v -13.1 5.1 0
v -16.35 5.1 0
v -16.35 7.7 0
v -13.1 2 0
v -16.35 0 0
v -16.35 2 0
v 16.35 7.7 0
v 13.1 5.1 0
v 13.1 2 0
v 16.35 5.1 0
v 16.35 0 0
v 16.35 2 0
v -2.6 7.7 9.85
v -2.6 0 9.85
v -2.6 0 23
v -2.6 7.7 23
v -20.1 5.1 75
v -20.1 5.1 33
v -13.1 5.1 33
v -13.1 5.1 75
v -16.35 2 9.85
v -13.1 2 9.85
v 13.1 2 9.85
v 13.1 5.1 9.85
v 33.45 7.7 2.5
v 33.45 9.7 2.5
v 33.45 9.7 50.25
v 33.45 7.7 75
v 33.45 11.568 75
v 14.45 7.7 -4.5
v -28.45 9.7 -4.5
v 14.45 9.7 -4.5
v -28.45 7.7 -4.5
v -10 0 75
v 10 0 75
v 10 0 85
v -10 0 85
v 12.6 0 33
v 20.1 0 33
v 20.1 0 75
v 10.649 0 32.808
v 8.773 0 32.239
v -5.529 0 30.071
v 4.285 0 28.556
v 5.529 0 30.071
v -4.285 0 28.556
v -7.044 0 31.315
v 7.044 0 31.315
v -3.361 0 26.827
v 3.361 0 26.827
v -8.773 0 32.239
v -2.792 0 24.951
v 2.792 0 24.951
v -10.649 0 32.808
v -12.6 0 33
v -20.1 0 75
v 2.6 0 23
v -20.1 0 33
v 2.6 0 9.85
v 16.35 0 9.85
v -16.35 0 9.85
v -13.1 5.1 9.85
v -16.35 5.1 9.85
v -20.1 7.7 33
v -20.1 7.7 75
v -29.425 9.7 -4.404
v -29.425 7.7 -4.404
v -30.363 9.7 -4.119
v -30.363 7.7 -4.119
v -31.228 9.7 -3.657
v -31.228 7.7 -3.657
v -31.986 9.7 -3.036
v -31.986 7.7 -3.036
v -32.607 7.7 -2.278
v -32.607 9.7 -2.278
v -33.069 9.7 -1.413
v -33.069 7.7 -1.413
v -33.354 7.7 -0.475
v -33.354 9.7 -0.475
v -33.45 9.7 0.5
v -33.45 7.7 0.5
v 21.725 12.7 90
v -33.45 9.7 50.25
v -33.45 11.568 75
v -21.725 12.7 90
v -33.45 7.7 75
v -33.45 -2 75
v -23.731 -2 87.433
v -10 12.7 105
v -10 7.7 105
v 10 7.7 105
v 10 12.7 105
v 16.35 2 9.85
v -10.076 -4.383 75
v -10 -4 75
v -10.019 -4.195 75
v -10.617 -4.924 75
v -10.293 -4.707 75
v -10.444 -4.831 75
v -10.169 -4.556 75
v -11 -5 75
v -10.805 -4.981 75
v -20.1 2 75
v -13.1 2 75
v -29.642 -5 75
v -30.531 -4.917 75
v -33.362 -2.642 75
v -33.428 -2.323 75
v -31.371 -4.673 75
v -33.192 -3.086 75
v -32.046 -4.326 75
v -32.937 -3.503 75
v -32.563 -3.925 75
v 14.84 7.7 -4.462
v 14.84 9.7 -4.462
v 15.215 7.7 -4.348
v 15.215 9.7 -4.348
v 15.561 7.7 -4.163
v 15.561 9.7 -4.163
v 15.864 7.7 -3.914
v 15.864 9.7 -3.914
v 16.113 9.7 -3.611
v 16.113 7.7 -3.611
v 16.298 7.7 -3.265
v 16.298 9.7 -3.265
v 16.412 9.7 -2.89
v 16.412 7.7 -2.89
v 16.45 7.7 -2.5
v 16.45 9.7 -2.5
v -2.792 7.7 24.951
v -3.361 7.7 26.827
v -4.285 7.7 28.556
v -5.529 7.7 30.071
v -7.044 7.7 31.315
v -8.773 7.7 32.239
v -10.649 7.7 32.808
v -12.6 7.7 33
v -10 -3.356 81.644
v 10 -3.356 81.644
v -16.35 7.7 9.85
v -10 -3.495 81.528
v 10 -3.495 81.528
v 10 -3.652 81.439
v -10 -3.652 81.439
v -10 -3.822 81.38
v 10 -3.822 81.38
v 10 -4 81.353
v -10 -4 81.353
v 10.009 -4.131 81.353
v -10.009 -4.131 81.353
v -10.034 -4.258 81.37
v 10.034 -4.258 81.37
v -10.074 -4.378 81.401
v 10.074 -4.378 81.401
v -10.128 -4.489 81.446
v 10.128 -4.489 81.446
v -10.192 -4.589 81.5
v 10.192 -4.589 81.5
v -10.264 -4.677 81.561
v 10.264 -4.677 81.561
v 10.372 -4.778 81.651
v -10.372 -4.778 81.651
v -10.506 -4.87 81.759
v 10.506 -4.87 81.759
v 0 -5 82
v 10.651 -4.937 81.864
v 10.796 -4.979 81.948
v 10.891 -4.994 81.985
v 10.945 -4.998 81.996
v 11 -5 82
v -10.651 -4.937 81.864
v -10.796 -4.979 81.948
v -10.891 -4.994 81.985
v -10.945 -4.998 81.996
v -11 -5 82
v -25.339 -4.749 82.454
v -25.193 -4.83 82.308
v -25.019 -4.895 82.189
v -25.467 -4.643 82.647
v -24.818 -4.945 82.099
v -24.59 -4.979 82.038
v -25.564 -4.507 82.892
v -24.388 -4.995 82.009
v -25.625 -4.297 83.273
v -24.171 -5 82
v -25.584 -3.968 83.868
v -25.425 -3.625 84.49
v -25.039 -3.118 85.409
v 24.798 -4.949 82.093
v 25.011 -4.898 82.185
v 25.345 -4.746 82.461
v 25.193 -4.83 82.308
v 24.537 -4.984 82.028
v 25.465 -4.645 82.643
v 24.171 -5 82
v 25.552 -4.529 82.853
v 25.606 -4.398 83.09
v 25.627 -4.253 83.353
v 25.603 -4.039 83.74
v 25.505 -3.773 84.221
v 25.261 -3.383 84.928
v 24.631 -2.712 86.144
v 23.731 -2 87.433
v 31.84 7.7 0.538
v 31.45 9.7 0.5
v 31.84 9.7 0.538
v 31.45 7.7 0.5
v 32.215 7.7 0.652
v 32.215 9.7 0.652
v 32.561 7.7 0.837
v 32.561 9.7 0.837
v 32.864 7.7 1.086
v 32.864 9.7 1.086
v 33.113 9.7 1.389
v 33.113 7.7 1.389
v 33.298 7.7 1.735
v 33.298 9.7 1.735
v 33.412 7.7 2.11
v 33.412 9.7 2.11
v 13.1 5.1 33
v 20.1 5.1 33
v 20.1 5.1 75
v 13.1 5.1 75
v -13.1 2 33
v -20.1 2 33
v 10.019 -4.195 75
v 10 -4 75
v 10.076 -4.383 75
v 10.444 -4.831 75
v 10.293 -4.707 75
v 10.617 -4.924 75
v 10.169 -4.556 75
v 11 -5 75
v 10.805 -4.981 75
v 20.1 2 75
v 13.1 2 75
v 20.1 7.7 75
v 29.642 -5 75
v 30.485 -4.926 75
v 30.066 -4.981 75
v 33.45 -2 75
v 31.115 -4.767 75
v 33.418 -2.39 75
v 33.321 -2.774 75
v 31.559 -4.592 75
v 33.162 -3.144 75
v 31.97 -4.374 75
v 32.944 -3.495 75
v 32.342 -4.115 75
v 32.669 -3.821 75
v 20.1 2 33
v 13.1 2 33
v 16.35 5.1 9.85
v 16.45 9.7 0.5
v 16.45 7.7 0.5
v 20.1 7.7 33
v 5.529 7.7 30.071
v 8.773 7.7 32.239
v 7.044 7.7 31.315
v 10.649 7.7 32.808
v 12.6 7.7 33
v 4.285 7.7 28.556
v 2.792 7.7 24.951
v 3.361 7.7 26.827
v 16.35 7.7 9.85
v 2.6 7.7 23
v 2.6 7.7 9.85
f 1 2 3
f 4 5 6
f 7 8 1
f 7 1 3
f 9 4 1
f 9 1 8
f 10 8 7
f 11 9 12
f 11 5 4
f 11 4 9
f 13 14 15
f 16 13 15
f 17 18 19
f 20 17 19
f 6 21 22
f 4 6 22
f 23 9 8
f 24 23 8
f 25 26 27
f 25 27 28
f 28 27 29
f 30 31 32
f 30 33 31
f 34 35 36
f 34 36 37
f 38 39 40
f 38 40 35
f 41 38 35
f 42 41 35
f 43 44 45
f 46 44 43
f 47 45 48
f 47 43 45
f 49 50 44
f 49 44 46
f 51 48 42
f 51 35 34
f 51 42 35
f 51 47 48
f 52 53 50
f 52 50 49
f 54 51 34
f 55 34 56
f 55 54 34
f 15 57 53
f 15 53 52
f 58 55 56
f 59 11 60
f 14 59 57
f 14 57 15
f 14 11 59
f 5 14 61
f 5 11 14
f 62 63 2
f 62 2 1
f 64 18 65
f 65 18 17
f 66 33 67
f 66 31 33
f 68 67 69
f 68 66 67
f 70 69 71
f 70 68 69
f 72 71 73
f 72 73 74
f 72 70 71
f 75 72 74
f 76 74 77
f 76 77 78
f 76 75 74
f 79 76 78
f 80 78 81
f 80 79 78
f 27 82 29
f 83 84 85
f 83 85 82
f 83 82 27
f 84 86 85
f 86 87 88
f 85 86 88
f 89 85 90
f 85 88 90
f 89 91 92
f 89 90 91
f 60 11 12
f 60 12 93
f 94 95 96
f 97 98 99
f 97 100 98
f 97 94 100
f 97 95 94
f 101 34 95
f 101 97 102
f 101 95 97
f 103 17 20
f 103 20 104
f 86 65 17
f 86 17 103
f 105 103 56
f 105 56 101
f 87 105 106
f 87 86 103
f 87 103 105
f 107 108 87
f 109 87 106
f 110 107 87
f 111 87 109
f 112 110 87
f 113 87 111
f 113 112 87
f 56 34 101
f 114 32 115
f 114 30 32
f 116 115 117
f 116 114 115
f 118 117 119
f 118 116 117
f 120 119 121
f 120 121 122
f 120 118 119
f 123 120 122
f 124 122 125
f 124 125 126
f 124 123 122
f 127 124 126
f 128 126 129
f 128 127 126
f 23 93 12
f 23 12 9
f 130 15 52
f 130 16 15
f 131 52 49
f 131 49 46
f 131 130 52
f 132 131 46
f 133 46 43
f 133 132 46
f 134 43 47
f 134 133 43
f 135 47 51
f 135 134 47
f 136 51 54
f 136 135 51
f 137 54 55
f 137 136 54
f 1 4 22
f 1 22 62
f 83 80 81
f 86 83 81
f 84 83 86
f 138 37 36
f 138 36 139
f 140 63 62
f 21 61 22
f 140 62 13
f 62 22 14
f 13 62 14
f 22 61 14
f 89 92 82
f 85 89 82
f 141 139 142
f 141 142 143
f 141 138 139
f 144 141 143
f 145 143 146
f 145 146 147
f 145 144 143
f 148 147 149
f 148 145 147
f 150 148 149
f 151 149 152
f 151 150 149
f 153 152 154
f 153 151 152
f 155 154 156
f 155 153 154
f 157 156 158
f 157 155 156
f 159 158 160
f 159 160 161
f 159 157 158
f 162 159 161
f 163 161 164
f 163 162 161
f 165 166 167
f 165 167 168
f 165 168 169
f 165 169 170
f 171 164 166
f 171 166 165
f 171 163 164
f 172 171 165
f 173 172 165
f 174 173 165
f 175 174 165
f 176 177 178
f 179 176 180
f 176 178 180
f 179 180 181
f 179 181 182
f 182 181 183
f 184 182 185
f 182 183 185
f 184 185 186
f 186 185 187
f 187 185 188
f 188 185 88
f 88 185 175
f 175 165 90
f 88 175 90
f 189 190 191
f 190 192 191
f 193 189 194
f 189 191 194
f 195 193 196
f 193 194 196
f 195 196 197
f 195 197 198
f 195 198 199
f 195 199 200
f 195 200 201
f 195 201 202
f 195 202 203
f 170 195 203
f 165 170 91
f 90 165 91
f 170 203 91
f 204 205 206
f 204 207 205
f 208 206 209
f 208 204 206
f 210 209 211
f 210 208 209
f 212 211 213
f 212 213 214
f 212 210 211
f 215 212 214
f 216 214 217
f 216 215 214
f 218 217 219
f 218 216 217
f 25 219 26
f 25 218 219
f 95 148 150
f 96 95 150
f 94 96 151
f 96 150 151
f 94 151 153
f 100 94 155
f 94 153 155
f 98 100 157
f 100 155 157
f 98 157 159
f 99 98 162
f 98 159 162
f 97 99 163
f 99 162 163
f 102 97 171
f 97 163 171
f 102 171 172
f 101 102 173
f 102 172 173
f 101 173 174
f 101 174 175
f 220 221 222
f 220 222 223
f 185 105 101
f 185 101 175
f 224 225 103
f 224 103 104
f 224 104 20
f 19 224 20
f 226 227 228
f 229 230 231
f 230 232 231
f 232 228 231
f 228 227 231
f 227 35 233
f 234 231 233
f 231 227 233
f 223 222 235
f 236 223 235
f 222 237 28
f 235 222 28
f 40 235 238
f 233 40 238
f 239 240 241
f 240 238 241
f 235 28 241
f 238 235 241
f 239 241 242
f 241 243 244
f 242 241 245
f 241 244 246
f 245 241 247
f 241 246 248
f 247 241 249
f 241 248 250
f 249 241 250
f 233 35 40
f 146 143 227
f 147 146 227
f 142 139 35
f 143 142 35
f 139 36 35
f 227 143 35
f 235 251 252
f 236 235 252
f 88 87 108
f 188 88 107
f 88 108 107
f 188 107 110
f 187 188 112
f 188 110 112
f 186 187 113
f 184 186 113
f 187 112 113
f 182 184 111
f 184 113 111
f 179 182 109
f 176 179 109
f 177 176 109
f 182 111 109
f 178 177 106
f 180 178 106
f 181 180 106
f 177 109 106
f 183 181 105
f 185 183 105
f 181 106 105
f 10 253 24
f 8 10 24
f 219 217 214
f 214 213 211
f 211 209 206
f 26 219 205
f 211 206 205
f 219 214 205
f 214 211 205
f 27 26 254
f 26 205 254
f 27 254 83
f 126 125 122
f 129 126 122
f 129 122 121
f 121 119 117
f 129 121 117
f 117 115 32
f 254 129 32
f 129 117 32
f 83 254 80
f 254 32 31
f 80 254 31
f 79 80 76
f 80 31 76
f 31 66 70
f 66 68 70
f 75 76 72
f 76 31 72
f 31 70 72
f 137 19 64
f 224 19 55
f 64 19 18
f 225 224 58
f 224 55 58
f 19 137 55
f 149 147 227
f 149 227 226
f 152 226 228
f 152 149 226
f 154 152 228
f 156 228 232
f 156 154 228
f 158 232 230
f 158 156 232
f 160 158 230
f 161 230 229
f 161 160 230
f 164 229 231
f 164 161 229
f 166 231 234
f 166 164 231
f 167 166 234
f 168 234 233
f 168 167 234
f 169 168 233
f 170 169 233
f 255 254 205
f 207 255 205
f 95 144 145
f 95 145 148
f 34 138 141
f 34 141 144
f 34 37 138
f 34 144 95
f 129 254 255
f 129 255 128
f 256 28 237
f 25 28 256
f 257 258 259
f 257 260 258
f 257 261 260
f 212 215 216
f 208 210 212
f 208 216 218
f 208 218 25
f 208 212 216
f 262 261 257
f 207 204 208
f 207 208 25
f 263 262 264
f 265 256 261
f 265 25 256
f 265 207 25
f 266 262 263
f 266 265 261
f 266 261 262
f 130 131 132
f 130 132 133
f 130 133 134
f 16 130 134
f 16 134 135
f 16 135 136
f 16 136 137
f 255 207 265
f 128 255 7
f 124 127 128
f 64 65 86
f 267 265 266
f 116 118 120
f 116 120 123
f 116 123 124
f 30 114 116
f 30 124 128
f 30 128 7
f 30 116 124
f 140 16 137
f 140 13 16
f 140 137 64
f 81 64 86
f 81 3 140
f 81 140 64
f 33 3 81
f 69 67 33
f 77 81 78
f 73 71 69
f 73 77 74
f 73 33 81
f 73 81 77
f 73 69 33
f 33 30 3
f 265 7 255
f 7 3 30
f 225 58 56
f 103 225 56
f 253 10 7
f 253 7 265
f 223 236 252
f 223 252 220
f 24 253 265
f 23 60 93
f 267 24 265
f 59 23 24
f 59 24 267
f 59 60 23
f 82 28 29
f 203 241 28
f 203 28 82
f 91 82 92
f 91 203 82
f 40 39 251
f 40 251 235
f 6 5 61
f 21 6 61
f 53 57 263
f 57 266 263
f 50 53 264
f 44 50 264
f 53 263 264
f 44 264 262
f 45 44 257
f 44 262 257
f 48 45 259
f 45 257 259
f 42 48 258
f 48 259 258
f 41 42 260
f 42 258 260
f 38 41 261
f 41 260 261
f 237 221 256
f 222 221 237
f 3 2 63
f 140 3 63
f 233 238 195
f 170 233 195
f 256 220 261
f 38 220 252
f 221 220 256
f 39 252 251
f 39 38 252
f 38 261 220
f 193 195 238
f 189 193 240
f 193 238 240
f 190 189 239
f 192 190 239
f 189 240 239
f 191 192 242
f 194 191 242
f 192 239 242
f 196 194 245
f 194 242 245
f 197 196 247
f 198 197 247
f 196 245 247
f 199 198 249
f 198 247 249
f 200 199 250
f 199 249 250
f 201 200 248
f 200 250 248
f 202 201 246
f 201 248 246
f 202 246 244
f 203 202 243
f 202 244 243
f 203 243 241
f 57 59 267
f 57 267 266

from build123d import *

# Parameters (mm, degrees)
BOSS_EXTRUDE1_DEPTH     = 7.7
SKETCH2_W               = 7
SKETCH2_H               = 3.1
CUT_EXTRUDE1_DEPTH      = 79.027559234
FILLET1_R               = 10
BOSS_EXTRUDE2_DEPTH     = 2
BOSS_EXTRUDE3_DEPTH     = 33.45
BOSS_EXTRUDE4_REACH     = 112.929
CUT_EXTRUDE2_DEPTH      = 111.928772192
CUT_EXTRUDE2_DEPTH_BACK = 111.928772192
CUT_EXTRUDE3_DEPTH      = 10
FILLET3_R               = 1
FILLET5_R               = 3
SKETCH8_W               = 17
SKETCH8_H               = 5
CUT_EXTRUDE4_DEPTH      = 2
FILLET6_R               = 5
FILLET7_R               = 2


with BuildPart() as part:
    # Sketch1 → Boss-Extrude1 (new body)
    with BuildSketch(Plane(origin=(0, 0, 0), x_dir=(1, 0, 0), z_dir=(0, 1, 0))):
        Polygon((0, 0), (-16.35, 0), (-16.35, -9.85), (-2.6, -9.85), (-2.6, -33), (-20.1, -33), (-20.1, -75), (0, -75), align=None)
    extrude(amount=BOSS_EXTRUDE1_DEPTH)

    # Sketch2 → Cut-Extrude1 (cut, through all)
    with BuildSketch(Plane.XY.offset(75)):
        with Locations((-16.6, 3.55)):
            Rectangle(SKETCH2_W, SKETCH2_H)
    extrude(amount=-CUT_EXTRUDE1_DEPTH, mode=Mode.SUBTRACT)

    # Fillet1
    fillet1_edges = [part.edges().sort_by_distance(p)[0] for p in [
        (-2.6, 3.85, 33),
    ]]
    fillet(fillet1_edges, radius=FILLET1_R)

    # Sketch3 → Boss-Extrude2 (add)
    with BuildSketch(Plane(origin=(0, 7.7, 0), x_dir=(1, 0, 0), z_dir=(0, 1, 0))):
        Polygon((0, 4.5), (-33.45, 4.5), (-33.45, -75), (-10, -105), (0, -105), align=None)
    extrude(amount=BOSS_EXTRUDE2_DEPTH)

    # Sketch4 → Boss-Extrude3 (add)
    with BuildSketch(Plane(origin=(0, 0, 0), x_dir=(0, 0, -1), z_dir=(1, 0, 0))):
        Polygon((-105, 9.7), (-105, 12.7), (-90, 12.7), (-50.25, 9.7), align=None)
    extrude(amount=-BOSS_EXTRUDE3_DEPTH)

    # Boss-Extrude4: up to this face of the body (flat: up to its plane)
    boss_extrude4_end = Plane(part.part.faces().sort_by_distance((0, 5.848980441, 46.191947566))[0])
    # Sketch5 → Boss-Extrude4 (add, up to the picked face)
    with BuildSketch(Plane.ZY.offset(33.45), mode=Mode.PRIVATE) as boss_extrude4_sk1:
        Polygon((75, 7.7), (75, -5), (82, -5), (105, 7.7), align=None)
    boss_extrude4_tool1 = split(extrude(boss_extrude4_sk1.sketch, amount=-BOSS_EXTRUDE4_REACH, mode=Mode.PRIVATE), bisect_by=boss_extrude4_end, keep=Keep.BOTH, mode=Mode.PRIVATE)
    add(boss_extrude4_tool1.solids().sort_by(Axis((-33.45, 2.665766, 85.441441), (1, 0, 0)))[0])

    # Sketch6 → Cut-Extrude2 (cut, two sides: drawn at the far end of the back side and taken through both)
    with BuildSketch(Plane(origin=(0, 7.7, 0), x_dir=(1, 0, 0), z_dir=(0, 1, 0)).offset(-CUT_EXTRUDE2_DEPTH_BACK)):
        Polygon((-33.45, -75), (-10, -105), (-33.45, -105), align=None)
    extrude(amount=CUT_EXTRUDE2_DEPTH + CUT_EXTRUDE2_DEPTH_BACK, mode=Mode.SUBTRACT)

    # Sketch7 → Cut-Extrude3 (cut)
    with BuildSketch(Plane(origin=(0, 0, 0), x_dir=(0, 0, -1), z_dir=(1, 0, 0))):
        Polygon((-75, 0), (-85, 0), (-80, -5), (-75, -5), align=None)
    extrude(amount=-CUT_EXTRUDE3_DEPTH, mode=Mode.SUBTRACT)

    # Fillet3
    # the kernel refuses this fillet: 1 mm, written as the material it takes off along each edge
    with BuildSketch(Plane(origin=(5.810983209, -5, 80), x_dir=(0, 0, 1), z_dir=(-1, 0, 0))) as fillet3_piece_1:
        with BuildLine():
            CenterArc((2.350701034, 0.936487472), FILLET3_R, 135, 114.469800521)
            Line((1.643594253, 1.643594253), (1.629452117, 1.657736389))
            Line((1.629452117, 1.657736389), (-0.014142136, 0.014142136))
            Line((-0.014142136, 0.014142136), (0, -0.02))
            ThreePointArc((0, -0.02), (1, -0.02), (1.992985979, -0.018729749))
            Line((1.992985979, -0.018729749), (2, 0))
        make_face()
    extrude(amount=15.810983209, mode=Mode.SUBTRACT)
    with BuildSketch(Plane(origin=(-10, -5, 82.5), x_dir=(-1, 0, 0), z_dir=(0, 0, -1))) as fillet3_piece_2_section:
        with BuildLine():
            CenterArc((FILLET3_R, FILLET3_R), FILLET3_R, 180, 90)
            Line((0, FILLET3_R), (-FILLET3_R * 0.02, FILLET3_R))
            Line((-FILLET3_R * 0.02, FILLET3_R), (-FILLET3_R * 0.02, -FILLET3_R * 0.02))
            Line((-FILLET3_R * 0.02, -FILLET3_R * 0.02), (FILLET3_R, -FILLET3_R * 0.02))
            Line((FILLET3_R, -FILLET3_R * 0.02), (FILLET3_R, 0))
        make_face()
    fillet3_piece_2 = extrude(amount=10, mode=Mode.PRIVATE)
    fillet3_piece_2 = split(fillet3_piece_2, bisect_by=Plane(origin=(-10.222841489, -6.700692184, 78.299307816), z_dir=(0, 0.7071067811865466, -0.7071067811865485)), keep=Keep.TOP, mode=Mode.PRIVATE)
    add(fillet3_piece_2, mode=Mode.SUBTRACT)
    with BuildSketch(Plane(origin=(5.810983209, -5, 80), x_dir=(0, 0, 1), z_dir=(-1, 0, 0))) as fillet3_piece_3a_section:
        with BuildLine():
            CenterArc((2.350701034, 0.936487472), FILLET3_R, 135, 114.469800521)
            Line((1.643594253, 1.643594253), (1.629452117, 1.657736389))
            Line((1.629452117, 1.657736389), (-0.014142136, 0.014142136))
            Line((-0.014142136, 0.014142136), (0, -0.02))
            ThreePointArc((0, -0.02), (1, -0.02), (1.992985979, -0.018729749))
            Line((1.992985979, -0.018729749), (2, 0))
        make_face()
    fillet3_piece_3a = extrude(amount=21.621966417, mode=Mode.PRIVATE)
    fillet3_piece_3a = split(fillet3_piece_3a, bisect_by=Plane(origin=(-10, -4.567151235, 80.996776665), z_dir=(-1, 0, 0)), keep=Keep.TOP, mode=Mode.PRIVATE)
    with BuildSketch(Plane(origin=(-10, -5, 82.5), x_dir=(-1, 0, 0), z_dir=(0, 0, -1))) as fillet3_piece_3b_section:
        with BuildLine():
            CenterArc((FILLET3_R, FILLET3_R), FILLET3_R, 180, 90)
            Line((0, FILLET3_R), (-FILLET3_R * 0.02, FILLET3_R))
            Line((-FILLET3_R * 0.02, FILLET3_R), (-FILLET3_R * 0.02, -FILLET3_R * 0.02))
            Line((-FILLET3_R * 0.02, -FILLET3_R * 0.02), (FILLET3_R, -FILLET3_R * 0.02))
            Line((FILLET3_R, -FILLET3_R * 0.02), (FILLET3_R, 0))
        make_face()
    fillet3_piece_3b = extrude(amount=10, mode=Mode.PRIVATE)
    fillet3_piece_3b = split(fillet3_piece_3b, bisect_by=Plane(origin=(-10.238471404, -4.220535034, 80.779464966), z_dir=(0, -0.7071067811865466, 0.7071067811865485)), keep=Keep.TOP, mode=Mode.PRIVATE)
    fillet3_piece_3 = fillet3_piece_3a & fillet3_piece_3b
    add(fillet3_piece_3, mode=Mode.SUBTRACT)

    # Mirror1: part across plane


with BuildPart() as part_1:
    add(part.part)
    add(part.part.mirror(Plane(origin=(0, 7.7, 75), x_dir=(0, 0, 1), z_dir=(-1, 0, 0))))

    # Fillet5
    # the kernel refuses this fillet: 3 mm, written as the material it takes off along each edge
    with BuildSketch(Plane(origin=(-38.068859068, -5, 69.091011854), x_dir=(0, 1, 0), z_dir=(0.6158478756904763, 0, 0.7878650861711843)), Plane(origin=(38.068859068, -5, 69.091011854), x_dir=(-0.7878650861711843, 0, -0.6158478756904764), z_dir=(-0.6158478756904763, 0, 0.7878650861711843))) as fillet5_piece_1:
        with BuildLine():
            CenterArc((FILLET5_R, -FILLET5_R), FILLET5_R, 90, 90)
            Line((0, -FILLET5_R), (0, 0))
            Line((0, 0), (FILLET5_R, 0))
        make_face()
    extrude(amount=23.884769896, mode=Mode.SUBTRACT)

    # Sketch8 → Cut-Extrude4 (cut)
    with BuildSketch(Plane(origin=(0, 9.7, 0), x_dir=(1, 0, 0), z_dir=(0, 1, 0))):
        with Locations((24.95, 2)):
            Rectangle(SKETCH8_W, SKETCH8_H)
    extrude(amount=-CUT_EXTRUDE4_DEPTH, mode=Mode.SUBTRACT)

    # Fillet6
    fillet6_edges = [part_1.edges().sort_by_distance(p)[0] for p in [
        (-33.45, 8.7, -4.5),
    ]]
    fillet(fillet6_edges, radius=FILLET6_R)

    # Fillet7
    fillet7_edges = [part_1.edges().sort_by_distance(p)[0] for p in [
        (16.45, 8.7, -4.5),
        (33.45, 8.7, 0.5),
    ]]
    fillet(fillet7_edges, radius=FILLET7_R)


solid = part_1.part
